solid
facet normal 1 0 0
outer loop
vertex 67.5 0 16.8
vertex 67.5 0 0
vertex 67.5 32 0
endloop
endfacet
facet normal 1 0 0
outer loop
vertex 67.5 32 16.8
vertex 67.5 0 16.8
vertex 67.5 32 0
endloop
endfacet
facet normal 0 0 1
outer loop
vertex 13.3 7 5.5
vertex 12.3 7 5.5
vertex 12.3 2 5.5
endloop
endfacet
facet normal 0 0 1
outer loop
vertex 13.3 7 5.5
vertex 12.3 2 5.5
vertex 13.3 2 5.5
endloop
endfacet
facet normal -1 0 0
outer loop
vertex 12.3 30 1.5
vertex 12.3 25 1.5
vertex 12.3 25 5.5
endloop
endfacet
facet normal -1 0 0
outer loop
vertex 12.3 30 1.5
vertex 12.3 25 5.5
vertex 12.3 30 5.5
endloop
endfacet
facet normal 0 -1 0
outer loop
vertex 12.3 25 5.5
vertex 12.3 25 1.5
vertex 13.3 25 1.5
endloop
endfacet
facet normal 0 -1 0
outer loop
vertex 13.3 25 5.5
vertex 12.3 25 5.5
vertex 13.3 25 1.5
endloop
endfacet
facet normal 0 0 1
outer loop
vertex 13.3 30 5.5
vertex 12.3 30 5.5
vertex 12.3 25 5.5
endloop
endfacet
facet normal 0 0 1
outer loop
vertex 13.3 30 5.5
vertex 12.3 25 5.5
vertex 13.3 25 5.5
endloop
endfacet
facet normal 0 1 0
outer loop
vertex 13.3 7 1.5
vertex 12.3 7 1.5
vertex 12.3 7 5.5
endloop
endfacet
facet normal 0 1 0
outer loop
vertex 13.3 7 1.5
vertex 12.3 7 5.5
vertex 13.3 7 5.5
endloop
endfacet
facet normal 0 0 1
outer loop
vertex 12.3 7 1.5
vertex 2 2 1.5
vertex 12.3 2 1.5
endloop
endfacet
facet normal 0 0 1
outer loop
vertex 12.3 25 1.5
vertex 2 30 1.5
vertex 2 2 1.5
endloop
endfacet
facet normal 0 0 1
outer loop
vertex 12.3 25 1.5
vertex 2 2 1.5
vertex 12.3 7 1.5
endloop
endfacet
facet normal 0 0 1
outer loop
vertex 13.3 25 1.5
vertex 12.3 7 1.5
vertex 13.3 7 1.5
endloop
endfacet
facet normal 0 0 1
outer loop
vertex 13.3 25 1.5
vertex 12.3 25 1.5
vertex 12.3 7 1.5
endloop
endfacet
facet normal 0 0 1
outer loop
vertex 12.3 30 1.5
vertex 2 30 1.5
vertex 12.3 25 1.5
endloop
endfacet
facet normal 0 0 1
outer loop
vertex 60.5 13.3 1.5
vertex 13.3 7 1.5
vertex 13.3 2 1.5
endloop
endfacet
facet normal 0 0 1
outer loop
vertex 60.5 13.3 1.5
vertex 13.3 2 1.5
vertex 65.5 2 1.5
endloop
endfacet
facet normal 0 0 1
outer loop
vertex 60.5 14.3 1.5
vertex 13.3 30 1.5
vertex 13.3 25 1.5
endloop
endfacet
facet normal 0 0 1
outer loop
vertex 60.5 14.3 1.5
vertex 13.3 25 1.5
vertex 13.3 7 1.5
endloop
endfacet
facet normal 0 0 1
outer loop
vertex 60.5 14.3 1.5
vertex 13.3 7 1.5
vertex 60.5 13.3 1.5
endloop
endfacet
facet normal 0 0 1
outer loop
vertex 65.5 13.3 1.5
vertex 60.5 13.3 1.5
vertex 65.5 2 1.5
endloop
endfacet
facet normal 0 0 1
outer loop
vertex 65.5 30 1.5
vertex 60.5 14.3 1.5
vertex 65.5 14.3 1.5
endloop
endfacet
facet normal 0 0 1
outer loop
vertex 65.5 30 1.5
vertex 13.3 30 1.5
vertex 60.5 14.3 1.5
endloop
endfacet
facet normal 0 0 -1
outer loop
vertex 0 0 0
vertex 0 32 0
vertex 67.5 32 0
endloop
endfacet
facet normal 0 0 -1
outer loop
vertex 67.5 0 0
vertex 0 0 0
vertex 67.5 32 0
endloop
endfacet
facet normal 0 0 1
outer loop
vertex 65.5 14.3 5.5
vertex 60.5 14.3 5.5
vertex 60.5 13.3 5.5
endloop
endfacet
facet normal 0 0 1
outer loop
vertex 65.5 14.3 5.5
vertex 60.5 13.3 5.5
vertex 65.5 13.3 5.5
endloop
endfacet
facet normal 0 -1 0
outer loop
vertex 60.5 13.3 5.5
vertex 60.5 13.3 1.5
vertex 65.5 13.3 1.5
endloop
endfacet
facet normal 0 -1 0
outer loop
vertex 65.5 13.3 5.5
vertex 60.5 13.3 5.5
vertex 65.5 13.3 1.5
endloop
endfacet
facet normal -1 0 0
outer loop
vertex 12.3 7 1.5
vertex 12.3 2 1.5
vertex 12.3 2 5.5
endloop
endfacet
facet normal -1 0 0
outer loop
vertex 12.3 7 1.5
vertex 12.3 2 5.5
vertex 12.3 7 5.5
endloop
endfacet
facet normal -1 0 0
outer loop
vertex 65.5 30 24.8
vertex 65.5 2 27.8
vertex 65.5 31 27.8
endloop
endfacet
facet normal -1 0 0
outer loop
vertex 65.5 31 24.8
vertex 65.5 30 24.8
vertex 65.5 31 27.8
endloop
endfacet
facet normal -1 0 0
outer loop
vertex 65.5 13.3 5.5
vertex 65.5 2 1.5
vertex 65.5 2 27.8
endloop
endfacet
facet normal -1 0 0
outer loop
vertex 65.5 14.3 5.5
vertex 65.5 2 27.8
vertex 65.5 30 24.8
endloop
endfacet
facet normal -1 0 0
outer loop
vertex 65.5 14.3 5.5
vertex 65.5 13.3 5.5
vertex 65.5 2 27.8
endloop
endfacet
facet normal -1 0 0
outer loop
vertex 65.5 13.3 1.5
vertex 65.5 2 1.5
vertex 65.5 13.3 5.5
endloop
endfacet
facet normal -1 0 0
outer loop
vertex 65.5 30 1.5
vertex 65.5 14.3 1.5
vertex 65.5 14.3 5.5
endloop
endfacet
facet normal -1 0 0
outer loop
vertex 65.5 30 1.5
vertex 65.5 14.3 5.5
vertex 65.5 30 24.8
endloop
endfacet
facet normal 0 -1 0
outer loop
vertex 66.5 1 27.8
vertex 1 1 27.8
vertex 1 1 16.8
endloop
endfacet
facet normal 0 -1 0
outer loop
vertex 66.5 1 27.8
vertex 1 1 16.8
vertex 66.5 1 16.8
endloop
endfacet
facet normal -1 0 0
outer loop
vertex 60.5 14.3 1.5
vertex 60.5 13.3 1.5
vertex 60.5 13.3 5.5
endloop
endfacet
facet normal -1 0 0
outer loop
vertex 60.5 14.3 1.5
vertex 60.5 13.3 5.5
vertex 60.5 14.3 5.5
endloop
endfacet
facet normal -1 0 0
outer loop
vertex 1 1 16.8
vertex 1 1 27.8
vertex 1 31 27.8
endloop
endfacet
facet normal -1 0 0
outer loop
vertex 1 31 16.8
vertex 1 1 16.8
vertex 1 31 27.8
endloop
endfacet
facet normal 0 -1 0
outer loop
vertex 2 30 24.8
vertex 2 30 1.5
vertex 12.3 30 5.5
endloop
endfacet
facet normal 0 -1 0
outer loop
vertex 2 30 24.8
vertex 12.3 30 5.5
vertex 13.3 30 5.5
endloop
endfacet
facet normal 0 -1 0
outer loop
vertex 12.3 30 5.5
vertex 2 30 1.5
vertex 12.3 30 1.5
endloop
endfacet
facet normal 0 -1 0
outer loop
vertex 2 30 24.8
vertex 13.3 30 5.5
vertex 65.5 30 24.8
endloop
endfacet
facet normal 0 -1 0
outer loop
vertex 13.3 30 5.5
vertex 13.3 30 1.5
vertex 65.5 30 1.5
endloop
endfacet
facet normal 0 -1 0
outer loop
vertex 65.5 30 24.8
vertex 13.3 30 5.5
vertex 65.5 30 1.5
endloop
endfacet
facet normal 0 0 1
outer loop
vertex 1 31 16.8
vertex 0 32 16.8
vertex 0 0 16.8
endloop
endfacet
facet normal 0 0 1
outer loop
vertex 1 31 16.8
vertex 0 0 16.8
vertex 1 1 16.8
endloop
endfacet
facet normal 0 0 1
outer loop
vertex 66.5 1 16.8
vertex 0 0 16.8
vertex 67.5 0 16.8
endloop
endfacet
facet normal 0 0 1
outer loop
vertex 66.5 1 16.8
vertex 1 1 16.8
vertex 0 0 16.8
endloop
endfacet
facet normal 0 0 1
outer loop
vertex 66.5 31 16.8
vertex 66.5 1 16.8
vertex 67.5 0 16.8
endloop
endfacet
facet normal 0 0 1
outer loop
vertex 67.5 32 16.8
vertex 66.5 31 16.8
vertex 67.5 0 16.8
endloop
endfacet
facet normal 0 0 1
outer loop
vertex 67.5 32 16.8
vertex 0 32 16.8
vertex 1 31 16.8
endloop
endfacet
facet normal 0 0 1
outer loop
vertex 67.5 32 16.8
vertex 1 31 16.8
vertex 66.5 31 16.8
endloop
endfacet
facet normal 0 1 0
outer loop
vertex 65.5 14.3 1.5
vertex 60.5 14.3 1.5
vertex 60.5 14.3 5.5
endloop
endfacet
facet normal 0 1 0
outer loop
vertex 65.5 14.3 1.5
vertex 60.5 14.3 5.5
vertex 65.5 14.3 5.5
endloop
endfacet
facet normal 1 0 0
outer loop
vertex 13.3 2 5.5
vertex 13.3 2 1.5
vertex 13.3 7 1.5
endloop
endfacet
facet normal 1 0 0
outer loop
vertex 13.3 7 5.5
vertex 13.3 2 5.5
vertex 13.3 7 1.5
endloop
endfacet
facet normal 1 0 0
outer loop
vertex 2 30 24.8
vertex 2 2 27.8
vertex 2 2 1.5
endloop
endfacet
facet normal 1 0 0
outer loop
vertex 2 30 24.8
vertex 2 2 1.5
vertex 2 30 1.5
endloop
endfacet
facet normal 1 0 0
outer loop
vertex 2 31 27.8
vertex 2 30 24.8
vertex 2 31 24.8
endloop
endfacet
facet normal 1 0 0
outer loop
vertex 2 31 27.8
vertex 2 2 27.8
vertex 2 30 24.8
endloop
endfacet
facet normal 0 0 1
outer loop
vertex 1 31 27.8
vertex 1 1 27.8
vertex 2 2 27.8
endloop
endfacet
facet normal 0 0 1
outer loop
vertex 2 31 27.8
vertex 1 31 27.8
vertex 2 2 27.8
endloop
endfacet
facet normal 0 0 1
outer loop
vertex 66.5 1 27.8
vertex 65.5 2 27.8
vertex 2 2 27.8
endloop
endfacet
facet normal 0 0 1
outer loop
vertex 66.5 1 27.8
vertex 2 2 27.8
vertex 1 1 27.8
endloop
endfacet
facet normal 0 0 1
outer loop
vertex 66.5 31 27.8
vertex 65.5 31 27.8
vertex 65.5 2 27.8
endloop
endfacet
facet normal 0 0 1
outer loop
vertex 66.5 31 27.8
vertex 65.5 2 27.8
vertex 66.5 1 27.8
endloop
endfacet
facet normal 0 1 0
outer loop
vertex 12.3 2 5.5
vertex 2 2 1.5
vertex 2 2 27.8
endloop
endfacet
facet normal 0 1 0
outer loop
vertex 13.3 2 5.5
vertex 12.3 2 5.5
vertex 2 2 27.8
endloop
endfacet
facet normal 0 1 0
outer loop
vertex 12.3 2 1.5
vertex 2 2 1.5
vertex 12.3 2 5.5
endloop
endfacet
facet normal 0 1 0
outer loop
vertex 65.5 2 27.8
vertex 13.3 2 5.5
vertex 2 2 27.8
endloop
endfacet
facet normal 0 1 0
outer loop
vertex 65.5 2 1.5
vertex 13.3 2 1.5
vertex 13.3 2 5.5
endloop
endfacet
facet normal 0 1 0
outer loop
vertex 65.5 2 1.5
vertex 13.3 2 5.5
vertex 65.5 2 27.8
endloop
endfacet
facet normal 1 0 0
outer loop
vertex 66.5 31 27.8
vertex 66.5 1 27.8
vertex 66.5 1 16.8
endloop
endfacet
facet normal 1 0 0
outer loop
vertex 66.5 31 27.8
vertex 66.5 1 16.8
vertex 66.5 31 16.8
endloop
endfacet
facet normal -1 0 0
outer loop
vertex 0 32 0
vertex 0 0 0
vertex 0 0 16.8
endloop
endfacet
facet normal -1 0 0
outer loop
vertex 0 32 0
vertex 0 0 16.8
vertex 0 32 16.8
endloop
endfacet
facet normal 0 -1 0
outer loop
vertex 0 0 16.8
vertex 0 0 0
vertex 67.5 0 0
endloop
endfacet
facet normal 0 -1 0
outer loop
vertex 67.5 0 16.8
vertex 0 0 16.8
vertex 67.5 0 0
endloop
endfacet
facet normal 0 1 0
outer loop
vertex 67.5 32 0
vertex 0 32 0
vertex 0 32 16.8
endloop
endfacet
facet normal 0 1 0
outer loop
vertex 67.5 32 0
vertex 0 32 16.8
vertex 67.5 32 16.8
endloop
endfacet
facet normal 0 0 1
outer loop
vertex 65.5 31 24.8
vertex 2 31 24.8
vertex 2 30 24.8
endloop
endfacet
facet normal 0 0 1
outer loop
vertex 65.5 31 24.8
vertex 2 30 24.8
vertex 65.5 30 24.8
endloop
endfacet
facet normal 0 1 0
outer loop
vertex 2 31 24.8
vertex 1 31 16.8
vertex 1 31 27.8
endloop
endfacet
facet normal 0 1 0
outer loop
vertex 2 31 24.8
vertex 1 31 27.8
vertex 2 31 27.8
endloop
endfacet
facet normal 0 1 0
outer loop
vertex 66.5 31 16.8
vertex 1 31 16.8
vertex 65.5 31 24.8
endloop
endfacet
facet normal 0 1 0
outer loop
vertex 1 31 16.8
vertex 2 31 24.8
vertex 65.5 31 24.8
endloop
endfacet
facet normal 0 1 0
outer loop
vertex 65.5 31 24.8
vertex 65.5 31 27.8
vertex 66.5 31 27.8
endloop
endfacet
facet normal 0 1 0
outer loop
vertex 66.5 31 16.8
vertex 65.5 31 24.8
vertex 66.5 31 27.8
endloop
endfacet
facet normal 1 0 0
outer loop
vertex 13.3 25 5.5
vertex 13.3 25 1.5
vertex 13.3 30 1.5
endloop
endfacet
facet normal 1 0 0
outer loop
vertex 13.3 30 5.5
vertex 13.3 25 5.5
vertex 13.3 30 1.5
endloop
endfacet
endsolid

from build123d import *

# Parameters (mm, degrees)
F0_W     = 67.5
F0_H     = 32
F1_DEPTH = 1.5
F2_W     = 67.5
F2_H     = 32
F2_W_2   = 63.5
F2_H_2   = 28
F3_DEPTH = 26.3
F4_W     = 63.5
F4_H     = 2
F5_DEPTH = 3
F6_W     = 67.5
F6_H     = 32
F6_W_2   = 65.5
F6_H_2   = 30
F7_DEPTH = 11
F8_W     = 5
F8_H     = 1
F8_W_2   = 1
F8_H_2   = 5
F9_DEPTH = 4


with BuildPart() as f1:
    # F0 (on Top) → F1 (new body)
    with BuildSketch(Plane.XY):
        with Locations((33.75, 16)):
            Rectangle(F0_W, F0_H)
    extrude(amount=F1_DEPTH)

    # F2 (on face) → F3 (join)
    with BuildSketch(Plane.XY.offset(1.5)):
        with Locations((33.75, 16)):
            Rectangle(F2_W, F2_H)
        with Locations((33.75, 16)):
            Rectangle(F2_W_2, F2_H_2, mode=Mode.SUBTRACT)
    extrude(amount=F3_DEPTH)

    # F4 (on face) → F5 (cut)
    with BuildSketch(Plane.XY.offset(27.8)):
        with Locations((33.75, 31)):
            Rectangle(F4_W, F4_H)
    extrude(amount=-F5_DEPTH, mode=Mode.SUBTRACT)

    # F6 (on face) → F7 (cut)
    with BuildSketch(Plane.XY.offset(27.8)):
        with Locations((33.75, 16)):
            Rectangle(F6_W, F6_H)
        with Locations((33.75, 16)):
            Rectangle(F6_W_2, F6_H_2, mode=Mode.SUBTRACT)
    extrude(amount=-F7_DEPTH, mode=Mode.SUBTRACT)

    # F8 (on face) → F9 (join)
    with BuildSketch(Plane.XY.offset(1.5)):
        with Locations((63, 13.8)):
            Rectangle(F8_W, F8_H)
        with Locations((12.8, 27.5)):
            Rectangle(F8_W_2, F8_H_2)
        with Locations((12.8, 4.5)):
            Rectangle(F8_W_2, F8_H_2)
    extrude(amount=F9_DEPTH)


solid = f1.part
